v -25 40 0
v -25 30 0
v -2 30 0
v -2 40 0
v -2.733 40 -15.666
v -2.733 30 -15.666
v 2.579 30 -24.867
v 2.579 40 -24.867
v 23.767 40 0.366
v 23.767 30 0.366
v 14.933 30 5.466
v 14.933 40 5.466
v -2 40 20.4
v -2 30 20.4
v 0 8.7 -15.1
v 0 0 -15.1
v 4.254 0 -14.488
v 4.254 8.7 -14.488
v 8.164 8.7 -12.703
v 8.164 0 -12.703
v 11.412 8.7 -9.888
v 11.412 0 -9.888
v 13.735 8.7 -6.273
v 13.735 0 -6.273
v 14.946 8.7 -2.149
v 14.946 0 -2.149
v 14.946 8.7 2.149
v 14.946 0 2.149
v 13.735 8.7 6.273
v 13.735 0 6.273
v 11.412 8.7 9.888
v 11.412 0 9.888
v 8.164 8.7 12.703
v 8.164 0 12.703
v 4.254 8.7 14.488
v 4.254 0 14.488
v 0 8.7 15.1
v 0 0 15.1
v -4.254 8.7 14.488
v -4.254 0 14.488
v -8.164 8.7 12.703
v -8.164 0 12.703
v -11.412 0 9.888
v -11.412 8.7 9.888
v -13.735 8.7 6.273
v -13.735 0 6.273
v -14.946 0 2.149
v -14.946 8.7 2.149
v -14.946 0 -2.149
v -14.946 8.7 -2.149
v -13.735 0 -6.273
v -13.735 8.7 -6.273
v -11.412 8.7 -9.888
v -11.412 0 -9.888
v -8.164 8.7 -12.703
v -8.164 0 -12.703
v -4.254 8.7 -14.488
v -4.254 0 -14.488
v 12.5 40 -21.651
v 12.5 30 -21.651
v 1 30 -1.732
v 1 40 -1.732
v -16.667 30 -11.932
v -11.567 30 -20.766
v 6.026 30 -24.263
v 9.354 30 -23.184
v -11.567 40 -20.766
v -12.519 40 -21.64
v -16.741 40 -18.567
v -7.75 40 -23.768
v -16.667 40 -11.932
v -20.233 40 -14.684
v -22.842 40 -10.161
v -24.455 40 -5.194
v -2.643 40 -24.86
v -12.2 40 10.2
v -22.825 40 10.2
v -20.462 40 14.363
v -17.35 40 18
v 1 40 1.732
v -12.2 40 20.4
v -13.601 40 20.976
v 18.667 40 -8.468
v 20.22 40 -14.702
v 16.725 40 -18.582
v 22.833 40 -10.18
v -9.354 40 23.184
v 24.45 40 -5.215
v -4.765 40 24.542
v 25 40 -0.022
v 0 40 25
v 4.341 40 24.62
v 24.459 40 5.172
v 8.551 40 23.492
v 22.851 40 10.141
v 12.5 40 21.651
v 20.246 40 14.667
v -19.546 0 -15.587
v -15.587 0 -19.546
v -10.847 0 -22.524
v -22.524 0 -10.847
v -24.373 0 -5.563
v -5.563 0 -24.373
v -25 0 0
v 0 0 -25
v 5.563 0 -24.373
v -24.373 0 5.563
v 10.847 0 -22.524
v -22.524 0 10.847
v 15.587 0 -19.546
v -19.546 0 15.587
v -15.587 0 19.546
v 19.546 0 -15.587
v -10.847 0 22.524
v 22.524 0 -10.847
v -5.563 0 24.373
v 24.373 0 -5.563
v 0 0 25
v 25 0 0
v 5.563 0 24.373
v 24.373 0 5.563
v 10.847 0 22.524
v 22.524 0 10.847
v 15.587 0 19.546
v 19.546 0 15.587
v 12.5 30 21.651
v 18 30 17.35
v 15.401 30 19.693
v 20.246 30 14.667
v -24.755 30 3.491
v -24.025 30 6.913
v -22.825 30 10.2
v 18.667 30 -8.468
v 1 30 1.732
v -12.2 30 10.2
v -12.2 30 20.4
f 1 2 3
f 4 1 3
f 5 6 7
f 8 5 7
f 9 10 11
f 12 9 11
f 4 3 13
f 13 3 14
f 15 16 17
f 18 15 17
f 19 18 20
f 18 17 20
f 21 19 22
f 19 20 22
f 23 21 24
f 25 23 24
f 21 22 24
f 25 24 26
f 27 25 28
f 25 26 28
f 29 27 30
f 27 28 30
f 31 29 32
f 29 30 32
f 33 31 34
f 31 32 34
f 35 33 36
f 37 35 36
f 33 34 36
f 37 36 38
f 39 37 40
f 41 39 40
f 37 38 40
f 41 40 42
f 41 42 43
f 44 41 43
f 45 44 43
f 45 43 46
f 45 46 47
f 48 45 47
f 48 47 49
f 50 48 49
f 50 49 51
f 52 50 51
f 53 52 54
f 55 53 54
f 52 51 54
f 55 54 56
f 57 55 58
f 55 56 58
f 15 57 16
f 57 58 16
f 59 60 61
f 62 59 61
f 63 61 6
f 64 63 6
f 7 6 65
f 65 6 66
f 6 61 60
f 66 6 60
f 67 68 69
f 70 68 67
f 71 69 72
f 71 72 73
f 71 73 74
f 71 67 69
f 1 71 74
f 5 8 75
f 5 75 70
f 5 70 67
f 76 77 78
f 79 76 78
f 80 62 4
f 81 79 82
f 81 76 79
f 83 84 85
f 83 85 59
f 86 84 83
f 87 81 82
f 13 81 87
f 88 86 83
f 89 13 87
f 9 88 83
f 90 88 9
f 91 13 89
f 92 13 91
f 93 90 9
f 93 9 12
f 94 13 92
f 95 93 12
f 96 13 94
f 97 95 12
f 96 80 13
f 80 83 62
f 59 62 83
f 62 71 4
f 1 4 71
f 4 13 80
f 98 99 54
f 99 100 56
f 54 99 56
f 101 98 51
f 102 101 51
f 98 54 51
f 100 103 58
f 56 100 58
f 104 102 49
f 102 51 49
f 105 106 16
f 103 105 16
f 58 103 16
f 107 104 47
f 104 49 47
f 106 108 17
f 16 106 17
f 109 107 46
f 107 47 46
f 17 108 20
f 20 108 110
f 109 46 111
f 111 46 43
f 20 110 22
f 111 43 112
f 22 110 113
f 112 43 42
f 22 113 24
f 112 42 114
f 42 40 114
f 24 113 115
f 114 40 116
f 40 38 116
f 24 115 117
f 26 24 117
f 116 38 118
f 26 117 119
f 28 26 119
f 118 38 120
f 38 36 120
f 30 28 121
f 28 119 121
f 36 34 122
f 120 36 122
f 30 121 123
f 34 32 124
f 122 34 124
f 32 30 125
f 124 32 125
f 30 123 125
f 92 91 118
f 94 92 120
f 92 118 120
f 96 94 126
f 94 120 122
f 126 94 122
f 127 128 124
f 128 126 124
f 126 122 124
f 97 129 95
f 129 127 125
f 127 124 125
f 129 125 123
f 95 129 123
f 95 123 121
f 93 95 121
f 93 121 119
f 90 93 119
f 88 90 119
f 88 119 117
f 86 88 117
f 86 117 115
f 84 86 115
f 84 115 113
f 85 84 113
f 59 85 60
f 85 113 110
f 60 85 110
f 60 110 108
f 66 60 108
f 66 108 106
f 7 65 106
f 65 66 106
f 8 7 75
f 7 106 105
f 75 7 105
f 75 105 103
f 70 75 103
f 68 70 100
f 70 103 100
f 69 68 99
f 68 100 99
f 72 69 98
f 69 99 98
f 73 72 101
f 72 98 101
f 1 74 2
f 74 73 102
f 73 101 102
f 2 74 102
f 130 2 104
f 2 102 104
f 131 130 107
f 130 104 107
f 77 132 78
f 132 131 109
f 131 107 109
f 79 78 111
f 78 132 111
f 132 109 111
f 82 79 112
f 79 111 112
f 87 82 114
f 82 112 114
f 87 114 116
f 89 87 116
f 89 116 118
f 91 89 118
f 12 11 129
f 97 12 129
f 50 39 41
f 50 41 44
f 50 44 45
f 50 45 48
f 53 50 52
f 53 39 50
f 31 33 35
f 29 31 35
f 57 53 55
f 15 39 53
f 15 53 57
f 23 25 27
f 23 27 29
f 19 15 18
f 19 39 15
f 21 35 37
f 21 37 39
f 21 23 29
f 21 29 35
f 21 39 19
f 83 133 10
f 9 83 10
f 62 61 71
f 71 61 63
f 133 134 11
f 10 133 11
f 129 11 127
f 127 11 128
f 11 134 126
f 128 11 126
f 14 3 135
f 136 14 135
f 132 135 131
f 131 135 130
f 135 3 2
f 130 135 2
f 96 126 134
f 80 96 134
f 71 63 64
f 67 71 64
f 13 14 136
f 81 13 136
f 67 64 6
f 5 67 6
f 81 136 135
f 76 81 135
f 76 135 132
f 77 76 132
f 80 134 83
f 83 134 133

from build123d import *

# Parameters (mm, degrees)
SKETCH1_R           = 25
BOSS_EXTRUDE1_DEPTH = 40
CUT_EXTRUDE1_START  = -10
CUT_EXTRUDE1_DEPTH  = 10
CIRPATTERN1_COUNT   = 3
SKETCH7_R           = 15.1
CUT_EXTRUDE3_DEPTH  = 8.7


with BuildPart() as part:
    # Sketch1 → Boss-Extrude1 (new body)
    with BuildSketch(Plane(origin=(0, 0, 0), x_dir=(1, 0, 0), z_dir=(0, 1, 0))):
        with Locations(Location((0, 0, 0), (0, 0, 270))):
            Circle(SKETCH1_R)
    extrude(amount=BOSS_EXTRUDE1_DEPTH)

    # Sketch2 → Cut-Extrude1 (cut)
    with BuildSketch(Plane(origin=(0, 40, 0), x_dir=(1, 0, 0), z_dir=(0, 1, 0)).offset(CUT_EXTRUDE1_START)):
        with BuildLine():
            Line((-25, 0), (-2, 0))
            Line((-2, 0), (-2, -20.4))
            Line((-2, -20.4), (-12.2, -20.4))
            Line((-12.2, -20.4), (-12.2, -10.2))
            Line((-12.2, -10.2), (-22.824548188, -10.2))
            ThreePointArc((-22.824548188, -10.2), (-24.450089005, -5.214704943), (-25, 0))
        make_face()
    cut_extrude1 = extrude(amount=CUT_EXTRUDE1_DEPTH, mode=Mode.SUBTRACT)

    # CirPattern1: Cut-Extrude1 ×3 about axis
    cirpattern1_axis = Axis((0, 0, 0), (0, 1, 0))
    for i in range(1, CIRPATTERN1_COUNT):
        add(cut_extrude1.rotate(cirpattern1_axis, i * 360 / CIRPATTERN1_COUNT), mode=Mode.SUBTRACT)

    # Sketch7 → Cut-Extrude3 (cut)
    with BuildSketch(Plane.XZ):
        with Locations(Location((0, 0, 0), (0, 0, 270))):
            Circle(SKETCH7_R)
    extrude(amount=-CUT_EXTRUDE3_DEPTH, mode=Mode.SUBTRACT)


solid = part.part
